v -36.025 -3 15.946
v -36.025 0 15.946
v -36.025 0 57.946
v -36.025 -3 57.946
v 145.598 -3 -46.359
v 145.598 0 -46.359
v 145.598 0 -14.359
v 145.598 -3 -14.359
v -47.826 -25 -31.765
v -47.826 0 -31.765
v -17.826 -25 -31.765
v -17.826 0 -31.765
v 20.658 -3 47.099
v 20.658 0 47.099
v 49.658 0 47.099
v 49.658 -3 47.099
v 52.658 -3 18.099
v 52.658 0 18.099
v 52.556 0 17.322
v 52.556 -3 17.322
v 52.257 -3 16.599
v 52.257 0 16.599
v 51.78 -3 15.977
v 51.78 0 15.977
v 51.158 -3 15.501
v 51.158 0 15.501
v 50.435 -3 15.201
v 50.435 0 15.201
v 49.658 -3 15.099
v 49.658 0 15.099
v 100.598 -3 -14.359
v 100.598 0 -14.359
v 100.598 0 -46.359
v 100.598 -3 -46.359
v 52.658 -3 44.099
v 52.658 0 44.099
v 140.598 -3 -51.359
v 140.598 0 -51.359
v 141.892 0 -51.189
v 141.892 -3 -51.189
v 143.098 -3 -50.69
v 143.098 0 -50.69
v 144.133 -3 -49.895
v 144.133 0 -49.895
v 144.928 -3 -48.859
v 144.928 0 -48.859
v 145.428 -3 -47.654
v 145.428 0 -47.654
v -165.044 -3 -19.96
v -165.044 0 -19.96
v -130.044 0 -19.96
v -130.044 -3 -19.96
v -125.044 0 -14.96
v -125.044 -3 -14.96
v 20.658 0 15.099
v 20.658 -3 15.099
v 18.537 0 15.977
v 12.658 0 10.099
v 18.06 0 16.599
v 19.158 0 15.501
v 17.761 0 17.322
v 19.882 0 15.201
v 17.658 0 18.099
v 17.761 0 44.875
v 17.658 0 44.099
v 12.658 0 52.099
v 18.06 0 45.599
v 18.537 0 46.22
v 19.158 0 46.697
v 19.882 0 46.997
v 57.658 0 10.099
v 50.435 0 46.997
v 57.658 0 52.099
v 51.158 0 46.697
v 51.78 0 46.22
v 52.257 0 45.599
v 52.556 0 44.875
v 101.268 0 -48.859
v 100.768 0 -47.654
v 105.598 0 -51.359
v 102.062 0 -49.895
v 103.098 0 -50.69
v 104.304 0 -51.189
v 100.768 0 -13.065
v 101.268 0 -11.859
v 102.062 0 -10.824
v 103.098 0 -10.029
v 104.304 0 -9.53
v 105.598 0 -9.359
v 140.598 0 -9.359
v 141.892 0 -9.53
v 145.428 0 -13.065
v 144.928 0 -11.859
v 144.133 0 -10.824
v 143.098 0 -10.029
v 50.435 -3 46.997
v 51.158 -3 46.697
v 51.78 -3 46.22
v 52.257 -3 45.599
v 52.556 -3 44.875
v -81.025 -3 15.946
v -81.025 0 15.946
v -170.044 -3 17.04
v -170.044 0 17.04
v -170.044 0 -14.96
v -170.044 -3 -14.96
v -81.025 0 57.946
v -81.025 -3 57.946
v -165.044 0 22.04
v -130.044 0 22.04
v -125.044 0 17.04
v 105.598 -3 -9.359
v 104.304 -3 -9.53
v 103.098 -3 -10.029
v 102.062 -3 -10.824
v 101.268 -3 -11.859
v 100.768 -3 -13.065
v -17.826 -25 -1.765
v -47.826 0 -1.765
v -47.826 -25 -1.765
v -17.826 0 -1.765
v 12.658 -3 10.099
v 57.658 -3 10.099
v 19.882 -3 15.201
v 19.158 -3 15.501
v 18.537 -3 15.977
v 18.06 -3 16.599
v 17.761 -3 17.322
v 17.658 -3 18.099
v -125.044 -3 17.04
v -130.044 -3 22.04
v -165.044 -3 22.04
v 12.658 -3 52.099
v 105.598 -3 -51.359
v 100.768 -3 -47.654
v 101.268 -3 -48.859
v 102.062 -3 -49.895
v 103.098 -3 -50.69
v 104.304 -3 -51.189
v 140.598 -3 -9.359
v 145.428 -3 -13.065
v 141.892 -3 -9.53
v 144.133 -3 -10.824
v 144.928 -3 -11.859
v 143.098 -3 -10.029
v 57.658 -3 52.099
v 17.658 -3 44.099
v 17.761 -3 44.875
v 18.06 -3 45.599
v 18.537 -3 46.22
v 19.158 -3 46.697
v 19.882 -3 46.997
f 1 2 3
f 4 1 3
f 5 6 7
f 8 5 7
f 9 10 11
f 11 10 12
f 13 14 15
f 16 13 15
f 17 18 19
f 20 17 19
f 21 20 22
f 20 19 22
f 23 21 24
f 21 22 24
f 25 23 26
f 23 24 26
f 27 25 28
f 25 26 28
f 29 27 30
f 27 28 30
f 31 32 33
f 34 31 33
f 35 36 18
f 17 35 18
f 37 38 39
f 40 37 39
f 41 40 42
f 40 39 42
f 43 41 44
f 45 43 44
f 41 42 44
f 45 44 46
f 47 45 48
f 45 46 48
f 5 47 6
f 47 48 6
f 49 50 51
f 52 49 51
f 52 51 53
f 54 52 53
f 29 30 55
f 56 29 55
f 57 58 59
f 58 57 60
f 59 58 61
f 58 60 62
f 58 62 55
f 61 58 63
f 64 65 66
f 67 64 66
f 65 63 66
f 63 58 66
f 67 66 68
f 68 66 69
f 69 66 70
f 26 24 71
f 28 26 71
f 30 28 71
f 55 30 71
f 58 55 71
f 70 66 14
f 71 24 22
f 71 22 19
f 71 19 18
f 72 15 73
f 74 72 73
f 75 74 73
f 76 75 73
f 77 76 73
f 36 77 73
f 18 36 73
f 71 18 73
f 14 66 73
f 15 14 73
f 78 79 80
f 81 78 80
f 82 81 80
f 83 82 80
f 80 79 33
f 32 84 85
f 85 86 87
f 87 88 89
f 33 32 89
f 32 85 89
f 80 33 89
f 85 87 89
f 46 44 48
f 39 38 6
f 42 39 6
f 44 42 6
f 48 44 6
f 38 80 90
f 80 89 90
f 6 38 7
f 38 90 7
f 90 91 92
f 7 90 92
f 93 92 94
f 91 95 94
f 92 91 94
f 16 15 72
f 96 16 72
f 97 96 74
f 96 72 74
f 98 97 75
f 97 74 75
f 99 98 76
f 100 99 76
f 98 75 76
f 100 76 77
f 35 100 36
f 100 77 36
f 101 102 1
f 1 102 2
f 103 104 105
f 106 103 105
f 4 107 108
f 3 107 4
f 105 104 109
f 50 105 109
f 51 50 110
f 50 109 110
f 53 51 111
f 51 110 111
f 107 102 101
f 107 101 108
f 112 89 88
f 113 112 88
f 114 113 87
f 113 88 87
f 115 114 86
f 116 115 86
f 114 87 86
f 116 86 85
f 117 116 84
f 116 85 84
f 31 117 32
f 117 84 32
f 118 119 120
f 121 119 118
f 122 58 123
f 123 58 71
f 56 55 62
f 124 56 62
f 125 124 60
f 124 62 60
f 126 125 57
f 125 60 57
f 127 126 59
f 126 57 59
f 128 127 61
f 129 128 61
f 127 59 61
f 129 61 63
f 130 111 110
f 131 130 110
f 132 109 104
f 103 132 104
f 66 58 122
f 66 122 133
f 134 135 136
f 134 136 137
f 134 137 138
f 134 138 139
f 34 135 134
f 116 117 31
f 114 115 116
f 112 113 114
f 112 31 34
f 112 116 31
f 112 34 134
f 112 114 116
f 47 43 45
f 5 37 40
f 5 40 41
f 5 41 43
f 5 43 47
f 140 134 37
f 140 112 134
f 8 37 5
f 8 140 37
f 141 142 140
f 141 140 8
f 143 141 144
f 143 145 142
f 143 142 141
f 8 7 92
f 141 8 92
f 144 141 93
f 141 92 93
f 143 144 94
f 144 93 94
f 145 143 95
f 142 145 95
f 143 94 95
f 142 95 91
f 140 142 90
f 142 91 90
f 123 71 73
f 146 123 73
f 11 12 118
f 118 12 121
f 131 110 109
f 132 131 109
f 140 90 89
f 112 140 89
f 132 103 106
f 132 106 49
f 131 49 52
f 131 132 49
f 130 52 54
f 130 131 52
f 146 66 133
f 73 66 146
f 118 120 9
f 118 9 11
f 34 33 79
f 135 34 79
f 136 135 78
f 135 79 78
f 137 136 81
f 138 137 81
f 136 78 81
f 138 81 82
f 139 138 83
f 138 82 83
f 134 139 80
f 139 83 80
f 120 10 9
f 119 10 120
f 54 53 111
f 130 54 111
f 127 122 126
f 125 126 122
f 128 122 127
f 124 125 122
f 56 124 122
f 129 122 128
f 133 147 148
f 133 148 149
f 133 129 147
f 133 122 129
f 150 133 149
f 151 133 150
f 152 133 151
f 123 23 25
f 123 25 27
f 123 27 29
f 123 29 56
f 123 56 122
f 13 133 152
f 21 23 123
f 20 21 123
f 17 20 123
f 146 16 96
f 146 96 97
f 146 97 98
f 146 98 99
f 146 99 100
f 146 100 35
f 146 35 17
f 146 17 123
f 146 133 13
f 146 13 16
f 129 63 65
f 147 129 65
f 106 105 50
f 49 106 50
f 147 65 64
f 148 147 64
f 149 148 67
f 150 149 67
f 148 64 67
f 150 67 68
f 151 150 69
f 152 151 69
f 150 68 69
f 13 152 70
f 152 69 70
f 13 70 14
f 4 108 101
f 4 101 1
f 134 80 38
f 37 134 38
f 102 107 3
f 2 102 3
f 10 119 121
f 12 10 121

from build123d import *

# Parameters (mm, degrees)
F0_W     = 45
F0_H     = 42
F1_DEPTH = 3
F2_W     = 45
F2_H     = 42
F3_DEPTH = 3
F4_W     = 30
F4_H     = 30
F5_DEPTH = 25
F7_DEPTH = 3
F9_DEPTH = 3


with BuildPart() as f1:
    # F0 (on Front) → F1 (new body)
    with BuildSketch(Plane.XZ):
        with Locations((-58.52517, 36.945819)):
            Rectangle(F0_W, F0_H)
    extrude(amount=F1_DEPTH)


with BuildPart() as f3:
    # F2 (on Front) → F3 (new body)
    with BuildSketch(Plane.XZ):
        with Locations((35.158463, 31.098792)):
            Rectangle(F2_W, F2_H)
        with BuildLine():
            Line((20.658463, 47.098792), (49.658463, 47.098792))
            ThreePointArc((49.658463, 47.098792), (51.779783, 46.220113), (52.658463, 44.098792))
            Line((52.658463, 44.098792), (52.658463, 18.098792))
            ThreePointArc((52.658463, 18.098792), (51.779783, 15.977472), (49.658463, 15.098792))
            Line((49.658463, 15.098792), (20.658463, 15.098792))
            ThreePointArc((20.658463, 15.098792), (18.537143, 15.977472), (17.658463, 18.098792))
            Line((17.658463, 18.098792), (17.658463, 44.098792))
            ThreePointArc((17.658463, 44.098792), (18.537143, 46.220113), (20.658463, 47.098792))
        make_face(mode=Mode.SUBTRACT)
    extrude(amount=F3_DEPTH)


with BuildPart() as f5:
    # F4 (on Front) → F5 (new body)
    with BuildSketch(Plane.XZ):
        with Locations((-32.826145, -16.765122)):
            Rectangle(F4_W, F4_H)
    extrude(amount=F5_DEPTH)


with BuildPart() as f7:
    # F6 (on Front) → F7 (new body)
    with BuildSketch(Plane.XZ):
        with BuildLine():
            Line((140.597949, -9.359423), (105.597949, -9.359423))
            ThreePointArc((105.597949, -9.359423), (102.062415, -10.823889), (100.597949, -14.359423))
            Line((100.597949, -14.359423), (100.597949, -46.359423))
            ThreePointArc((100.597949, -46.359423), (102.062415, -49.894957), (105.597949, -51.359423))
            Line((105.597949, -51.359423), (140.597949, -51.359423))
            ThreePointArc((140.597949, -51.359423), (144.133483, -49.894957), (145.597949, -46.359423))
            Line((145.597949, -46.359423), (145.597949, -14.359423))
            ThreePointArc((145.597949, -14.359423), (144.133483, -10.823889), (140.597949, -9.359423))
        make_face()
    extrude(amount=F7_DEPTH)


with BuildPart() as f9:
    # F8 (on Front) → F9 (new body)
    with BuildSketch(Plane.XZ):
        Polygon((-130.044452, 22.039932), (-165.044452, 22.039932), (-170.044452, 17.039932), (-170.044452, -14.960068), (-165.044452, -19.960068), (-130.044452, -19.960068), (-125.044452, -14.960068), (-125.044452, 17.039932), align=None)
    extrude(amount=F9_DEPTH)


solid = Compound([f1.part, f3.part, f5.part, f7.part, f9.part])
